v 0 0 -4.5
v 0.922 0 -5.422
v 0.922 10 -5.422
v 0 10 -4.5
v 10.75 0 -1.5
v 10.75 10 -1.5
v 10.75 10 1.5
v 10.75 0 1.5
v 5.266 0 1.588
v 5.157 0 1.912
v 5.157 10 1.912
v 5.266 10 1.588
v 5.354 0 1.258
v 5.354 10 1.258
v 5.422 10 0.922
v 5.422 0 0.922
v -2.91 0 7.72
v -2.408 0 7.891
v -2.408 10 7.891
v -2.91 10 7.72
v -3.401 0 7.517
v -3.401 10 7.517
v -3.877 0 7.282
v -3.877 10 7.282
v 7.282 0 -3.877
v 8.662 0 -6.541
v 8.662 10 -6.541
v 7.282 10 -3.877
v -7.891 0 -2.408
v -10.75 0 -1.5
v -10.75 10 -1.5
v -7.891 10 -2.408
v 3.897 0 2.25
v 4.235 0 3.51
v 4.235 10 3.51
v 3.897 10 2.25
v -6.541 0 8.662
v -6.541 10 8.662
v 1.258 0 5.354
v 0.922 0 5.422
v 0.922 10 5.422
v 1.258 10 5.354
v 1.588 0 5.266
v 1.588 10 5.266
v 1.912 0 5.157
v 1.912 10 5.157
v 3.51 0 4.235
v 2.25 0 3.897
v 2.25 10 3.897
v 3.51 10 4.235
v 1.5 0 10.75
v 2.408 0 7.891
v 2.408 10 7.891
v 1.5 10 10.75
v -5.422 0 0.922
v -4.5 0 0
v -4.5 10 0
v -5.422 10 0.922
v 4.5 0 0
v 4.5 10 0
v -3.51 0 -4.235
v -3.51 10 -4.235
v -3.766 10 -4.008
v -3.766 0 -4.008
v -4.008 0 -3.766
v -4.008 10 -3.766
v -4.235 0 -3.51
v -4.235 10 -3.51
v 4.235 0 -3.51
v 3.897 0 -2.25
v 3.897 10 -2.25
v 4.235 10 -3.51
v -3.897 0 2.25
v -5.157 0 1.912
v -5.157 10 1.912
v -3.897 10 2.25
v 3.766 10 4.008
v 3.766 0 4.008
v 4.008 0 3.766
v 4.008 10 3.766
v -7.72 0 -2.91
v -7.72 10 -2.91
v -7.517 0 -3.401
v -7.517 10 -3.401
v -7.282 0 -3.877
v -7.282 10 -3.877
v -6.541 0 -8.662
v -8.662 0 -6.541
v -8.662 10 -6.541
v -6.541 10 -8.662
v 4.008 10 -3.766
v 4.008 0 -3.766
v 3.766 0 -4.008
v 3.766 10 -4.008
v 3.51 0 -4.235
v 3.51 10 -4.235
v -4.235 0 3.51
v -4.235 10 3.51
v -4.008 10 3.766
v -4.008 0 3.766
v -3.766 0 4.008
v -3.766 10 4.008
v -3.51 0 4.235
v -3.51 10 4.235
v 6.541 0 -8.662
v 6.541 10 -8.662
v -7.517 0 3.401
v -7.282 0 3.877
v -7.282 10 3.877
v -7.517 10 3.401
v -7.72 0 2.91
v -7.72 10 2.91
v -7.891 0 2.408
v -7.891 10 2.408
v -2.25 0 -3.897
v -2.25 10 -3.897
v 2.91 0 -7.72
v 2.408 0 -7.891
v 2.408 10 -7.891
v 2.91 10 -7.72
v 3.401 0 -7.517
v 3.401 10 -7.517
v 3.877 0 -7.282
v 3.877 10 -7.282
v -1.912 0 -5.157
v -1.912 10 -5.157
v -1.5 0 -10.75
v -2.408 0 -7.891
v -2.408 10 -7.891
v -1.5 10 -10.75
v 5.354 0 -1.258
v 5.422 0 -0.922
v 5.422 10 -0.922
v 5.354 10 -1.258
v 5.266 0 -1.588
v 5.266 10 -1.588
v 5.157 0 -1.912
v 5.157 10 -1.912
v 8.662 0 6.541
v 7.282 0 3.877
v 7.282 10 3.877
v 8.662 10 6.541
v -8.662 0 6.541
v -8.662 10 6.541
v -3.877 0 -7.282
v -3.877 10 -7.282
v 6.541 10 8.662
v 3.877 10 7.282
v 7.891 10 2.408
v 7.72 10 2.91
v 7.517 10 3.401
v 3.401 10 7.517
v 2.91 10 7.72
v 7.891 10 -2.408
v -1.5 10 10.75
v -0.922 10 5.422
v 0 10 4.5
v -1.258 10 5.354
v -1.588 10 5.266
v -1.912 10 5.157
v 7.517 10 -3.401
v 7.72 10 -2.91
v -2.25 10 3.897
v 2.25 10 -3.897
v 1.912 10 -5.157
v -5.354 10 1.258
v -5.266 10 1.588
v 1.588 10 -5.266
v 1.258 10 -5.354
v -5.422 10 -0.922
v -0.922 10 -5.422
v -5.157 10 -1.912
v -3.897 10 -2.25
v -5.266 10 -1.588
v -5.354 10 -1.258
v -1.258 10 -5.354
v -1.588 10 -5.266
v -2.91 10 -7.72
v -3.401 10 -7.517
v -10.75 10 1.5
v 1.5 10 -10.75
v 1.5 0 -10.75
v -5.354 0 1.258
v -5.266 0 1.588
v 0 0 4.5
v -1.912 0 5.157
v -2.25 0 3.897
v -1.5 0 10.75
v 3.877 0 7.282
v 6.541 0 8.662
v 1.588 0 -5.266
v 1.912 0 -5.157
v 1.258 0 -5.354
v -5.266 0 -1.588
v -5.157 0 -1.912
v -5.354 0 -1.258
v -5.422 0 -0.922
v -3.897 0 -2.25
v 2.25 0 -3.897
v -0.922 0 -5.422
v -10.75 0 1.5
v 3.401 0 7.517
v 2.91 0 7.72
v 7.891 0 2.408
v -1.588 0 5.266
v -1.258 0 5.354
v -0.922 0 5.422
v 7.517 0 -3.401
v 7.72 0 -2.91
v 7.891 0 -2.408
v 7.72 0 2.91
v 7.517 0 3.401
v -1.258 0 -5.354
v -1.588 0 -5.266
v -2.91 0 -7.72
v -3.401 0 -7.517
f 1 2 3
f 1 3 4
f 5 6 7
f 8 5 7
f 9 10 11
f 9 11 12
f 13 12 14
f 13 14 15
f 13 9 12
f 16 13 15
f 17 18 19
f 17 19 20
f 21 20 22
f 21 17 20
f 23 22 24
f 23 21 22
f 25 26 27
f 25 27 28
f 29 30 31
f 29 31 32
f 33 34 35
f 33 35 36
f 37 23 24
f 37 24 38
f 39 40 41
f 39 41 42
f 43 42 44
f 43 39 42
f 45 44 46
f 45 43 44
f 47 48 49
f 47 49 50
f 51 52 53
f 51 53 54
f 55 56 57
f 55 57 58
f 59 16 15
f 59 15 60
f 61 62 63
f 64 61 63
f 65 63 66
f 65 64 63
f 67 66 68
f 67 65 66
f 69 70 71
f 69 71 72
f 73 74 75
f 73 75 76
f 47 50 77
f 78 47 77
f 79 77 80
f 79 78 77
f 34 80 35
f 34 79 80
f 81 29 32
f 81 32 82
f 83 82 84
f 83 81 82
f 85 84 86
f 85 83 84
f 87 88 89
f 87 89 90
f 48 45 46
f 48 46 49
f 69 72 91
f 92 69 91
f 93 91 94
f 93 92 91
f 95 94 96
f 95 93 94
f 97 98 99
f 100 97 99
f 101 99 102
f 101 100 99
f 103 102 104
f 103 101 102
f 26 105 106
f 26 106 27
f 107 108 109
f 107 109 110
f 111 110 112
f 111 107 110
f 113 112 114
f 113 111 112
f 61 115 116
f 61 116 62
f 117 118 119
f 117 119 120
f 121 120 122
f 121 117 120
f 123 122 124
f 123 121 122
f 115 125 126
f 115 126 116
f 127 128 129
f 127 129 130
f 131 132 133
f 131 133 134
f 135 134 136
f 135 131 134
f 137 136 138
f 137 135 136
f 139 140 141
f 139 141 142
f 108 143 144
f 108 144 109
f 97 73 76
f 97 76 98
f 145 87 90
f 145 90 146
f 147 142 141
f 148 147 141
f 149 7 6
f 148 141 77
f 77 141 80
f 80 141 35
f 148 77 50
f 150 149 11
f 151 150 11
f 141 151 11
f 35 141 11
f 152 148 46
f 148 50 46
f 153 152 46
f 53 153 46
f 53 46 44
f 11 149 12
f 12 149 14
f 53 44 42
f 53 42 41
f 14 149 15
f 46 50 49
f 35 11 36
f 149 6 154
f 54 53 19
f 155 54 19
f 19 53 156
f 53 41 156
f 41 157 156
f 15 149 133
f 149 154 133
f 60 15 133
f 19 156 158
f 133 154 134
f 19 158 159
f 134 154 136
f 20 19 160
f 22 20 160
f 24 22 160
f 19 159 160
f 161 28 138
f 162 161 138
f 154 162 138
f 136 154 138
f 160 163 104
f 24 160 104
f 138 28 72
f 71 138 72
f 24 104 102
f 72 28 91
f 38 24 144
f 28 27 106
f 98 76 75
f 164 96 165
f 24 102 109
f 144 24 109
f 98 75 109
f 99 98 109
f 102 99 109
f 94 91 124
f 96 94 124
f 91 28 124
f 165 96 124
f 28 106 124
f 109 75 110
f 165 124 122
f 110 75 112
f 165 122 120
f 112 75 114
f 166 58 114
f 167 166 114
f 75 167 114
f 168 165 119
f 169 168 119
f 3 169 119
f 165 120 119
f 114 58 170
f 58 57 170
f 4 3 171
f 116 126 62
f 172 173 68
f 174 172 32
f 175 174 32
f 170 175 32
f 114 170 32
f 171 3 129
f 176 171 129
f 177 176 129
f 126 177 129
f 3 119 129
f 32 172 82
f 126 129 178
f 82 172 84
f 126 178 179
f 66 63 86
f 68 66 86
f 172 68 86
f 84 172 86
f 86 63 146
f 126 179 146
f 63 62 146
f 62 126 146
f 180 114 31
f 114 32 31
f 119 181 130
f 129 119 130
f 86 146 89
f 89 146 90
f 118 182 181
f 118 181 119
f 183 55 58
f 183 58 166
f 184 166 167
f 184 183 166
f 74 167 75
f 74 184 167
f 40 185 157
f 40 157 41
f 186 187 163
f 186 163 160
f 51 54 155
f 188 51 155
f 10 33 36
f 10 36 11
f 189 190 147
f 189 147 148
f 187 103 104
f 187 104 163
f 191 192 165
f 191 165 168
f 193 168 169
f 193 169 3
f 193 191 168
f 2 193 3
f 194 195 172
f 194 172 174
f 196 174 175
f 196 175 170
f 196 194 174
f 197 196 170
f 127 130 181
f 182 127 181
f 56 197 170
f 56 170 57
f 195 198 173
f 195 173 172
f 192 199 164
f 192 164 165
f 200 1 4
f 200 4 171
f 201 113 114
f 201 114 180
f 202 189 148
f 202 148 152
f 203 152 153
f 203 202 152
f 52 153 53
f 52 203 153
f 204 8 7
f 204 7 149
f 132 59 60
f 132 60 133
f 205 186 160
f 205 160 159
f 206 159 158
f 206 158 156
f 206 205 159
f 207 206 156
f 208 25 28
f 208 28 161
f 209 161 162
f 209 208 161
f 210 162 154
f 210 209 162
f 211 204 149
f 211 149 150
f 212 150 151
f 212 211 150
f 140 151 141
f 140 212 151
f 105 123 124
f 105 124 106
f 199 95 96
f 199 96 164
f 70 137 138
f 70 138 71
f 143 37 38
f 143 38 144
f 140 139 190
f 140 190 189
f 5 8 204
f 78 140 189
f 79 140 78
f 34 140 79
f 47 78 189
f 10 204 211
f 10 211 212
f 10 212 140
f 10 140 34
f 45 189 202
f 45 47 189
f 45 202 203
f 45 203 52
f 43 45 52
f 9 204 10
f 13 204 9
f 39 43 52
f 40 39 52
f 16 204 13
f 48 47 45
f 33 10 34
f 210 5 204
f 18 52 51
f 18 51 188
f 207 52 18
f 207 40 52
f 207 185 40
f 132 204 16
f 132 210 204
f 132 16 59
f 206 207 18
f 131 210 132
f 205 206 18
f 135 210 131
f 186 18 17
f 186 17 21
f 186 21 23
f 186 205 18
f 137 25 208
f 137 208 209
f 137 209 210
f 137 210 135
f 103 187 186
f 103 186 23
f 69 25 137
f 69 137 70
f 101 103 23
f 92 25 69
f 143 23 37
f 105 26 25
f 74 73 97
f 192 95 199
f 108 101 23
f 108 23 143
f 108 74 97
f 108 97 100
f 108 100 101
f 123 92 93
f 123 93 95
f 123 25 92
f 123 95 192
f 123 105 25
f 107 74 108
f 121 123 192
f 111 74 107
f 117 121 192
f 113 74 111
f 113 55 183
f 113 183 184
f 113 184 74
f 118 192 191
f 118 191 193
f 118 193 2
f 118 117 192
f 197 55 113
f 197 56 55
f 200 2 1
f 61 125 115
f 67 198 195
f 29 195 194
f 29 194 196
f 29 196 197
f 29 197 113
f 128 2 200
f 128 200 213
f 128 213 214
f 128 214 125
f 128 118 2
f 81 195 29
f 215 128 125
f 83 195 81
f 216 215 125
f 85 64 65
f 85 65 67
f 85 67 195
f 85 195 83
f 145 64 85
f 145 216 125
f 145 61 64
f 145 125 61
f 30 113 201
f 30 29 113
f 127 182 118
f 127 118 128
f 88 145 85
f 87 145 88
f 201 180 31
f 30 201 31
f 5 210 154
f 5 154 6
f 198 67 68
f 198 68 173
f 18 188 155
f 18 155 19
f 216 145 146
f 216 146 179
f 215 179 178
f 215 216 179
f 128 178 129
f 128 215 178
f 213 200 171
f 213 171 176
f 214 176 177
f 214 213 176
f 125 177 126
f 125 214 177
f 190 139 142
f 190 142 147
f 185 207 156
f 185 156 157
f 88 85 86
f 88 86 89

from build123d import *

# Parameters (mm, degrees)
BOSS_EXTRUDE1_DEPTH = 10


with BuildPart() as part:
    # Sketch1 → Boss-Extrude1 (new body)
    with BuildSketch(Plane(origin=(0, 0, 0), x_dir=(1, 0, 0), z_dir=(0, 1, 0))):
        with BuildLine():
            Line((-1.5, 10.75), (1.5, 10.75))
            Line((1.5, 10.75), (2.408073523, 7.890733927))
            ThreePointArc((2.408073523, 7.890733927), (3.157138317, 7.622006143), (3.87682635, 7.282356586))
            Line((3.87682635, 7.282356586), (6.540737726, 8.66205807))
            Line((6.540737726, 8.66205807), (8.66205807, 6.540737726))
            Line((8.66205807, 6.540737726), (7.282356586, 3.87682635))
            ThreePointArc((7.282356586, 3.87682635), (7.622006143, 3.157138317), (7.890733927, 2.408073523))
            Line((7.890733927, 2.408073523), (10.75, 1.5))
            Line((10.75, 1.5), (10.75, -1.5))
            Line((10.75, -1.5), (7.890733927, -2.408073523))
            ThreePointArc((7.890733927, -2.408073523), (7.622006143, -3.157138317), (7.282356586, -3.87682635))
            Line((7.282356586, -3.87682635), (8.66205807, -6.540737726))
            Line((8.66205807, -6.540737726), (6.540737726, -8.66205807))
            Line((6.540737726, -8.66205807), (3.87682635, -7.282356586))
            ThreePointArc((3.87682635, -7.282356586), (3.157138317, -7.622006143), (2.408073523, -7.890733927))
            Line((2.408073523, -7.890733927), (1.5, -10.75))
            Line((1.5, -10.75), (-1.5, -10.75))
            Line((-1.5, -10.75), (-2.408073523, -7.890733927))
            ThreePointArc((-2.408073523, -7.890733927), (-3.157138317, -7.622006143), (-3.87682635, -7.282356586))
            Line((-3.87682635, -7.282356586), (-6.540737726, -8.66205807))
            Line((-6.540737726, -8.66205807), (-8.66205807, -6.540737726))
            Line((-8.66205807, -6.540737726), (-7.282356586, -3.87682635))
            ThreePointArc((-7.282356586, -3.87682635), (-7.622006143, -3.157138317), (-7.890733927, -2.408073523))
            Line((-7.890733927, -2.408073523), (-10.75, -1.5))
            Line((-10.75, -1.5), (-10.75, 1.5))
            Line((-10.75, 1.5), (-7.890733927, 2.408073523))
            ThreePointArc((-7.890733927, 2.408073523), (-7.622006143, 3.157138317), (-7.282356586, 3.87682635))
            Line((-7.282356586, 3.87682635), (-8.66205807, 6.540737726))
            Line((-8.66205807, 6.540737726), (-6.540737726, 8.66205807))
            Line((-6.540737726, 8.66205807), (-3.87682635, 7.282356586))
            ThreePointArc((-3.87682635, 7.282356586), (-3.157138317, 7.622006143), (-2.408073523, 7.890733927))
            Line((-2.408073523, 7.890733927), (-1.5, 10.75))
        make_face()
        with BuildLine():
            Line((0, 4.5), (-0.922144385, 5.422144385))
            ThreePointArc((-0.922144385, 5.422144385), (-1.423504748, 5.312592045), (-1.912471729, 5.156786973))
            Line((-1.912471729, 5.156786973), (-2.25, 3.897114317))
            Line((-2.25, 3.897114317), (-3.509672656, 4.234642588))
            ThreePointArc((-3.509672656, 4.234642588), (-3.889087297, 3.889087297), (-4.234642588, 3.509672656))
            Line((-4.234642588, 3.509672656), (-3.897114317, 2.25))
            Line((-3.897114317, 2.25), (-5.156786973, 1.912471729))
            ThreePointArc((-5.156786973, 1.912471729), (-5.312592045, 1.423504748), (-5.422144385, 0.922144385))
            Line((-5.422144385, 0.922144385), (-4.5, 0))
            Line((-4.5, 0), (-5.422144385, -0.922144385))
            ThreePointArc((-5.422144385, -0.922144385), (-5.312592045, -1.423504748), (-5.156786973, -1.912471729))
            Line((-5.156786973, -1.912471729), (-3.897114317, -2.25))
            Line((-3.897114317, -2.25), (-4.234642588, -3.509672656))
            ThreePointArc((-4.234642588, -3.509672656), (-3.889087297, -3.889087297), (-3.509672656, -4.234642588))
            Line((-3.509672656, -4.234642588), (-2.25, -3.897114317))
            Line((-2.25, -3.897114317), (-1.912471729, -5.156786973))
            ThreePointArc((-1.912471729, -5.156786973), (-1.423504748, -5.312592045), (-0.922144385, -5.422144385))
            Line((-0.922144385, -5.422144385), (0, -4.5))
            Line((0, -4.5), (0.922144385, -5.422144385))
            ThreePointArc((0.922144385, -5.422144385), (1.423504748, -5.312592045), (1.912471729, -5.156786973))
            Line((1.912471729, -5.156786973), (2.25, -3.897114317))
            Line((2.25, -3.897114317), (3.509672656, -4.234642588))
            ThreePointArc((3.509672656, -4.234642588), (3.889087297, -3.889087297), (4.234642588, -3.509672656))
            Line((4.234642588, -3.509672656), (3.897114317, -2.25))
            Line((3.897114317, -2.25), (5.156786973, -1.912471729))
            ThreePointArc((5.156786973, -1.912471729), (5.312592045, -1.423504748), (5.422144385, -0.922144385))
            Line((5.422144385, -0.922144385), (4.5, 0))
            Line((4.5, 0), (5.422144385, 0.922144385))
            ThreePointArc((5.422144385, 0.922144385), (5.312592045, 1.423504748), (5.156786973, 1.912471729))
            Line((5.156786973, 1.912471729), (3.897114317, 2.25))
            Line((3.897114317, 2.25), (4.234642588, 3.509672656))
            ThreePointArc((4.234642588, 3.509672656), (3.889087297, 3.889087297), (3.509672656, 4.234642588))
            Line((3.509672656, 4.234642588), (2.25, 3.897114317))
            Line((2.25, 3.897114317), (1.912471729, 5.156786973))
            ThreePointArc((1.912471729, 5.156786973), (1.423504748, 5.312592045), (0.922144385, 5.422144385))
            Line((0.922144385, 5.422144385), (0, 4.5))
        make_face(mode=Mode.SUBTRACT)
    extrude(amount=BOSS_EXTRUDE1_DEPTH)


solid = part.part
